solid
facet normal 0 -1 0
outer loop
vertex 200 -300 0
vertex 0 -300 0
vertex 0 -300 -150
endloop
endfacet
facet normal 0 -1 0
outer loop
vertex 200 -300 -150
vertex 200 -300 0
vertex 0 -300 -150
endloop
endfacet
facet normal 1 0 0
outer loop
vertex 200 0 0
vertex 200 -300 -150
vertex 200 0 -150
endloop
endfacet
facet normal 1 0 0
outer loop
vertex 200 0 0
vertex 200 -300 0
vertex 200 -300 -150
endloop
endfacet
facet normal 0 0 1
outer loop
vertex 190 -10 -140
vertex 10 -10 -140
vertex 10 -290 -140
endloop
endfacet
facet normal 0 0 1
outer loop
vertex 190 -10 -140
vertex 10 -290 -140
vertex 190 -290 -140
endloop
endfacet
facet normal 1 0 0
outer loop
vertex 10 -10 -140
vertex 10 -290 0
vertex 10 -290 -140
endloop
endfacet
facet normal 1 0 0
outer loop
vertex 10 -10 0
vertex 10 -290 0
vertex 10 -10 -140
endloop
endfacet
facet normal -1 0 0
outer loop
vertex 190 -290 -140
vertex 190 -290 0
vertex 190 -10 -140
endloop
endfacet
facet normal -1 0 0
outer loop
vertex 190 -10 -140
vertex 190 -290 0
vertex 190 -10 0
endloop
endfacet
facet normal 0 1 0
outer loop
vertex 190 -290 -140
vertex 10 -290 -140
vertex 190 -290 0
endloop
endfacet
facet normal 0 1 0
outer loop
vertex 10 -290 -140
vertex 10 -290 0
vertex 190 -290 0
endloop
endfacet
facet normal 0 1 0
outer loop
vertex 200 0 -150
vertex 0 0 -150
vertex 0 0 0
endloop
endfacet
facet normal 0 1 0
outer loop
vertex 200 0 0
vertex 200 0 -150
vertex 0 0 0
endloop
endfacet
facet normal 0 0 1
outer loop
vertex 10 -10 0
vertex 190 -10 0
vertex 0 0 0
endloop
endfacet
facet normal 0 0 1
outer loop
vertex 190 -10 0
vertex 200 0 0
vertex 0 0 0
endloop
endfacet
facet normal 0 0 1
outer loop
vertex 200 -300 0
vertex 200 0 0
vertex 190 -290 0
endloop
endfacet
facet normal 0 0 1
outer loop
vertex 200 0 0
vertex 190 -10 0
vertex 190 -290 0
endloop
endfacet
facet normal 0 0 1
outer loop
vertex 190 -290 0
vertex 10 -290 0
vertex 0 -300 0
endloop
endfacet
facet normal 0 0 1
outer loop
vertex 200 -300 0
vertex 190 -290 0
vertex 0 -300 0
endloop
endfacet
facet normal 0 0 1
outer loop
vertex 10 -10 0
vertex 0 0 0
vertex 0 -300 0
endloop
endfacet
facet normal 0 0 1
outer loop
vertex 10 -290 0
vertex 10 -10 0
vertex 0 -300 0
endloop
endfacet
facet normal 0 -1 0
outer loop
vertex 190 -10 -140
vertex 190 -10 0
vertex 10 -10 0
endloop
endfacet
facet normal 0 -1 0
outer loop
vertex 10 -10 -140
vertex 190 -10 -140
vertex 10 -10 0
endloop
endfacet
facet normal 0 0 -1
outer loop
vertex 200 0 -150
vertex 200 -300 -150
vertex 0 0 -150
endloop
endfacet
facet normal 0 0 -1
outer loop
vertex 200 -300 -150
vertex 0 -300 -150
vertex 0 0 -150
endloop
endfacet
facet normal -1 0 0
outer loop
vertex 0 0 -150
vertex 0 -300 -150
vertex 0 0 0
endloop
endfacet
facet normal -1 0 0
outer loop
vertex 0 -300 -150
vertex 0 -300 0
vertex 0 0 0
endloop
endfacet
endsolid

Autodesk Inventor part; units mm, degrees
ref_plane "YZ Plane" through (0, 0, 0) normal (1, 0, 0) x (0, 1, 0)
ref_plane "XZ Plane" through (0, 0, 0) normal (0, 1, 0) x (-1, 0, 0)
sketch "Sketch1" plane through (0, 0, 0) normal (1, 0, 0) x (0, 1, 0)
  line L0 (0, 0) -> (-300, 0)
  line L1 (-300, 0) -> (-300, -150)
  line L2 (-300, -150) -> (0, -150)
  line L3 (0, -150) -> (0, 0)
  dimension "d0" = 300
  dimension "d1" = 150
extrude "Extrusion1" add sketch "Sketch1" along normal blind 200
sketch "Sketch2" plane through (0, 0, 0) normal (-1, 0, 0) x (0, 0, 1)
  point P0 (0, 0)
sketch "Sketch3" plane through (0, -300, 0) normal (0, 0, 1) x (1, 0, 0)
  point P0 (0, 300)
sketch "Sketch4" plane through (0, -300, 0) normal (0, 0, 1) x (1, 0, 0)
  point P0 (0, 300)
sketch "Sketch5" plane through (0, -300, 0) normal (0, 0, 1) x (1, 0, 0)
  line L0 (0, 0) -> (200, 0) projected
  line L1 (0, 0) -> (190, 0)
  line L2 (190, 10) -> (190, 290)
  line L3 (190, 290) -> (0, 290)
  line L4 (0, 10) -> (0, 0)
  line L5 (-111.4723, 0) -> (-111.4723, 10)
  line L6 (10, 10) -> (190, 10)
  line L7 (0, -40.6594) -> (10, -40.6594)
  line L8 (10, 0) -> (10, 290)
  point P0 (0, 300)
  dimension "d4" = 190
  dimension "d5" = 290
  dimension "d6" = 10
  dimension "d7" = 10
extrude "Extrusion2" cut sketch "Sketch5" against normal blind 140
ref_plane "Work Plane1" through (0, -300, -150) normal (0, 0, -1) x (-1, 0, 0)
sketch "Sketch6" plane through (0, -300, -150) normal (0, 0, -1) x (-1, 0, 0)
  point P0 (0, 300)
sketch "Sketch7" plane through (0, -300, -150) normal (0, 0, -1) x (-1, 0, 0)
  line L0 (0, 340.13) -> (-50, 340.13)
  line L1 (-50, 340.13) -> (-50, -164.6167)
  line L2 (0, 300) -> (-200, 300) projected
  line L3 (0, 300) -> (0, 225)
  line L4 (0, 0) -> (0, 300) projected
  line L5 (-50, 225) -> (-50, 275)
  line L6 (-50, 275) -> (-70, 275)
  line L7 (-70, 275) -> (-70, 175)
  line L8 (-70, 175) -> (-30, 175)
  line L9 (-30, 175) -> (-30, 275)
  line L10 (-30, 275) -> (-50, 275)
  dimension "d14" = 50
  dimension "d15" = 75
  dimension "d16" = 50
  dimension "d17" = 20
  dimension "d18" = 100
  dimension "d19" = 40
  dimension "d20" = 100
  dimension "d21" = 20
extrude "Extrusion3" cut sketch "Sketch7" against normal blind 50
sketch "Sketch8" plane through (0, -300, -150) normal (0, 0, -1) x (-1, 0, 0)
  line L0 (0, 0) -> (0, 300) projected
  line L1 (0, 0) -> (0, 75)
  line L2 (-54.3985, -5.8801) -> (-4.3985, -5.8801)
  line L3 (0, 0) -> (-200, 0) projected
  line L4 (-100, 0) -> (-100, 75)
  line L5 (-54.3985, 75) -> (-34.3985, 75)
  line L6 (-34.3985, 75) -> (-34.3985, 25)
  line L7 (-34.3985, 25) -> (-74.3985, 25)
  line L8 (-74.3985, 25) -> (-74.3985, 125)
  line L9 (-74.3985, 125) -> (-34.3985, 125)
  line L10 (-34.3985, 125) -> (-34.3985, 75)
  line L11 (-10, 10) -> (-10, 290) projected
  line L12 (-200, 0) -> (-200, 300) projected
  line L13 (-200, 300) -> (-150, 300)
  line L14 (0, 300) -> (-200, 300) projected
  line L15 (-200, 300) -> (-200, 225)
  line L16 (-150, 225) -> (-170, 225)
  line L17 (-170, 225) -> (-170, 175)
  line L18 (-170, 175) -> (-130, 175)
  line L19 (-130, 175) -> (-130, 275)
  line L20 (-130, 275) -> (-170, 275)
  line L21 (-170, 275) -> (-170, 225)
  line L22 (-200, 0) -> (-200, 110.9429)
  line L23 (-200, 0) -> (-200, 75)
  line L24 (-200, 0) -> (-150, 0)
  line L25 (-150, 75) -> (-130, 75)
  line L26 (-130, 75) -> (-130, 25)
  line L27 (-130, 25) -> (-170, 25)
  line L28 (-170, 25) -> (-170, 125)
  line L29 (-170, 125) -> (-130, 125)
  line L30 (-130, 125) -> (-130, 75)
  dimension "d24" = 75
  dimension "d25" = 50
  dimension "d26" = 75
  dimension "d27" = 20
  dimension "d28" = 50
  dimension "d29" = 40
  dimension "d30" = 100
  dimension "d31" = 40
  dimension "d32" = 50
  dimension "d33" = 50
  dimension "d34" = 75
  dimension "d35" = 20
  dimension "d36" = 50
  dimension "d37" = 40
  dimension "d38" = 100
  dimension "d39" = 40
  dimension "d40" = 50
  dimension "d41" = 75
  dimension "d42" = 50
  dimension "d43" = 20
  dimension "d44" = 50
  dimension "d45" = 40
  dimension "d46" = 100
  dimension "d47" = 40
  dimension "d48" = 50
extrude "Extrusion4" cut sketch "Sketch8" against normal blind 50 contours L6 L7 L8 L9 L10 | L21 L20 L19 L18 L17 | L26 L27 L28 L29 L30
sketch "Sketch9" plane through (0, -300, -150) normal (0, 0, -1) x (-1, 0, 0)
  point P0 (0, 300)
sketch "Sketch14" plane through (0, -300, -150) normal (0, 0, -1) x (-1, 0, 0)
  line L0 (-30, 275) -> (-30, 175) projected
  line L1 (-70, 275) -> (-30, 275) projected
  line L2 (-30, 275) -> (-70, 275)
  line L3 (-70, 275) -> (-70, 175)
  line L4 (-30, 175) -> (-70, 175) projected
  line L5 (-70, 175) -> (-30, 175)
  line L6 (-30, 175) -> (-30, 275)
  line L7 (-130, 275) -> (-170, 275) projected
  line L8 (-130, 275) -> (-170, 275)
  line L9 (-170, 275) -> (-170, 175) projected
  line L10 (-170, 275) -> (-170, 175)
  line L11 (-130, 275) -> (-130, 175) projected
  line L12 (-170, 175) -> (-130, 175)
  line L13 (-130, 175) -> (-130, 275)
  line L14 (-34.3985, 25) -> (-34.3985, 125) projected
  line L15 (-74.3985, 25) -> (-74.3985, 125) projected
  line L16 (-34.3985, 125) -> (-74.3985, 125)
  line L17 (-74.3985, 125) -> (-74.3985, 25)
  line L18 (-34.3985, 25) -> (-74.3985, 25) projected
  line L19 (-74.3985, 25) -> (-34.3985, 25)
  line L20 (-34.3985, 25) -> (-34.3985, 125)
  line L21 (-130, 125) -> (-170, 125) projected
  line L22 (-130, 125) -> (-170, 125)
  line L23 (-130, 25) -> (-170, 25) projected
  line L24 (-170, 125) -> (-170, 25)
  line L25 (-170, 25) -> (-130, 25)
  line L26 (-130, 25) -> (-130, 125)
  point P0 (0, 300)
  dimension "d52" = 100
extrude "Extrusion5" add sketch "Sketch14" against normal blind 10
